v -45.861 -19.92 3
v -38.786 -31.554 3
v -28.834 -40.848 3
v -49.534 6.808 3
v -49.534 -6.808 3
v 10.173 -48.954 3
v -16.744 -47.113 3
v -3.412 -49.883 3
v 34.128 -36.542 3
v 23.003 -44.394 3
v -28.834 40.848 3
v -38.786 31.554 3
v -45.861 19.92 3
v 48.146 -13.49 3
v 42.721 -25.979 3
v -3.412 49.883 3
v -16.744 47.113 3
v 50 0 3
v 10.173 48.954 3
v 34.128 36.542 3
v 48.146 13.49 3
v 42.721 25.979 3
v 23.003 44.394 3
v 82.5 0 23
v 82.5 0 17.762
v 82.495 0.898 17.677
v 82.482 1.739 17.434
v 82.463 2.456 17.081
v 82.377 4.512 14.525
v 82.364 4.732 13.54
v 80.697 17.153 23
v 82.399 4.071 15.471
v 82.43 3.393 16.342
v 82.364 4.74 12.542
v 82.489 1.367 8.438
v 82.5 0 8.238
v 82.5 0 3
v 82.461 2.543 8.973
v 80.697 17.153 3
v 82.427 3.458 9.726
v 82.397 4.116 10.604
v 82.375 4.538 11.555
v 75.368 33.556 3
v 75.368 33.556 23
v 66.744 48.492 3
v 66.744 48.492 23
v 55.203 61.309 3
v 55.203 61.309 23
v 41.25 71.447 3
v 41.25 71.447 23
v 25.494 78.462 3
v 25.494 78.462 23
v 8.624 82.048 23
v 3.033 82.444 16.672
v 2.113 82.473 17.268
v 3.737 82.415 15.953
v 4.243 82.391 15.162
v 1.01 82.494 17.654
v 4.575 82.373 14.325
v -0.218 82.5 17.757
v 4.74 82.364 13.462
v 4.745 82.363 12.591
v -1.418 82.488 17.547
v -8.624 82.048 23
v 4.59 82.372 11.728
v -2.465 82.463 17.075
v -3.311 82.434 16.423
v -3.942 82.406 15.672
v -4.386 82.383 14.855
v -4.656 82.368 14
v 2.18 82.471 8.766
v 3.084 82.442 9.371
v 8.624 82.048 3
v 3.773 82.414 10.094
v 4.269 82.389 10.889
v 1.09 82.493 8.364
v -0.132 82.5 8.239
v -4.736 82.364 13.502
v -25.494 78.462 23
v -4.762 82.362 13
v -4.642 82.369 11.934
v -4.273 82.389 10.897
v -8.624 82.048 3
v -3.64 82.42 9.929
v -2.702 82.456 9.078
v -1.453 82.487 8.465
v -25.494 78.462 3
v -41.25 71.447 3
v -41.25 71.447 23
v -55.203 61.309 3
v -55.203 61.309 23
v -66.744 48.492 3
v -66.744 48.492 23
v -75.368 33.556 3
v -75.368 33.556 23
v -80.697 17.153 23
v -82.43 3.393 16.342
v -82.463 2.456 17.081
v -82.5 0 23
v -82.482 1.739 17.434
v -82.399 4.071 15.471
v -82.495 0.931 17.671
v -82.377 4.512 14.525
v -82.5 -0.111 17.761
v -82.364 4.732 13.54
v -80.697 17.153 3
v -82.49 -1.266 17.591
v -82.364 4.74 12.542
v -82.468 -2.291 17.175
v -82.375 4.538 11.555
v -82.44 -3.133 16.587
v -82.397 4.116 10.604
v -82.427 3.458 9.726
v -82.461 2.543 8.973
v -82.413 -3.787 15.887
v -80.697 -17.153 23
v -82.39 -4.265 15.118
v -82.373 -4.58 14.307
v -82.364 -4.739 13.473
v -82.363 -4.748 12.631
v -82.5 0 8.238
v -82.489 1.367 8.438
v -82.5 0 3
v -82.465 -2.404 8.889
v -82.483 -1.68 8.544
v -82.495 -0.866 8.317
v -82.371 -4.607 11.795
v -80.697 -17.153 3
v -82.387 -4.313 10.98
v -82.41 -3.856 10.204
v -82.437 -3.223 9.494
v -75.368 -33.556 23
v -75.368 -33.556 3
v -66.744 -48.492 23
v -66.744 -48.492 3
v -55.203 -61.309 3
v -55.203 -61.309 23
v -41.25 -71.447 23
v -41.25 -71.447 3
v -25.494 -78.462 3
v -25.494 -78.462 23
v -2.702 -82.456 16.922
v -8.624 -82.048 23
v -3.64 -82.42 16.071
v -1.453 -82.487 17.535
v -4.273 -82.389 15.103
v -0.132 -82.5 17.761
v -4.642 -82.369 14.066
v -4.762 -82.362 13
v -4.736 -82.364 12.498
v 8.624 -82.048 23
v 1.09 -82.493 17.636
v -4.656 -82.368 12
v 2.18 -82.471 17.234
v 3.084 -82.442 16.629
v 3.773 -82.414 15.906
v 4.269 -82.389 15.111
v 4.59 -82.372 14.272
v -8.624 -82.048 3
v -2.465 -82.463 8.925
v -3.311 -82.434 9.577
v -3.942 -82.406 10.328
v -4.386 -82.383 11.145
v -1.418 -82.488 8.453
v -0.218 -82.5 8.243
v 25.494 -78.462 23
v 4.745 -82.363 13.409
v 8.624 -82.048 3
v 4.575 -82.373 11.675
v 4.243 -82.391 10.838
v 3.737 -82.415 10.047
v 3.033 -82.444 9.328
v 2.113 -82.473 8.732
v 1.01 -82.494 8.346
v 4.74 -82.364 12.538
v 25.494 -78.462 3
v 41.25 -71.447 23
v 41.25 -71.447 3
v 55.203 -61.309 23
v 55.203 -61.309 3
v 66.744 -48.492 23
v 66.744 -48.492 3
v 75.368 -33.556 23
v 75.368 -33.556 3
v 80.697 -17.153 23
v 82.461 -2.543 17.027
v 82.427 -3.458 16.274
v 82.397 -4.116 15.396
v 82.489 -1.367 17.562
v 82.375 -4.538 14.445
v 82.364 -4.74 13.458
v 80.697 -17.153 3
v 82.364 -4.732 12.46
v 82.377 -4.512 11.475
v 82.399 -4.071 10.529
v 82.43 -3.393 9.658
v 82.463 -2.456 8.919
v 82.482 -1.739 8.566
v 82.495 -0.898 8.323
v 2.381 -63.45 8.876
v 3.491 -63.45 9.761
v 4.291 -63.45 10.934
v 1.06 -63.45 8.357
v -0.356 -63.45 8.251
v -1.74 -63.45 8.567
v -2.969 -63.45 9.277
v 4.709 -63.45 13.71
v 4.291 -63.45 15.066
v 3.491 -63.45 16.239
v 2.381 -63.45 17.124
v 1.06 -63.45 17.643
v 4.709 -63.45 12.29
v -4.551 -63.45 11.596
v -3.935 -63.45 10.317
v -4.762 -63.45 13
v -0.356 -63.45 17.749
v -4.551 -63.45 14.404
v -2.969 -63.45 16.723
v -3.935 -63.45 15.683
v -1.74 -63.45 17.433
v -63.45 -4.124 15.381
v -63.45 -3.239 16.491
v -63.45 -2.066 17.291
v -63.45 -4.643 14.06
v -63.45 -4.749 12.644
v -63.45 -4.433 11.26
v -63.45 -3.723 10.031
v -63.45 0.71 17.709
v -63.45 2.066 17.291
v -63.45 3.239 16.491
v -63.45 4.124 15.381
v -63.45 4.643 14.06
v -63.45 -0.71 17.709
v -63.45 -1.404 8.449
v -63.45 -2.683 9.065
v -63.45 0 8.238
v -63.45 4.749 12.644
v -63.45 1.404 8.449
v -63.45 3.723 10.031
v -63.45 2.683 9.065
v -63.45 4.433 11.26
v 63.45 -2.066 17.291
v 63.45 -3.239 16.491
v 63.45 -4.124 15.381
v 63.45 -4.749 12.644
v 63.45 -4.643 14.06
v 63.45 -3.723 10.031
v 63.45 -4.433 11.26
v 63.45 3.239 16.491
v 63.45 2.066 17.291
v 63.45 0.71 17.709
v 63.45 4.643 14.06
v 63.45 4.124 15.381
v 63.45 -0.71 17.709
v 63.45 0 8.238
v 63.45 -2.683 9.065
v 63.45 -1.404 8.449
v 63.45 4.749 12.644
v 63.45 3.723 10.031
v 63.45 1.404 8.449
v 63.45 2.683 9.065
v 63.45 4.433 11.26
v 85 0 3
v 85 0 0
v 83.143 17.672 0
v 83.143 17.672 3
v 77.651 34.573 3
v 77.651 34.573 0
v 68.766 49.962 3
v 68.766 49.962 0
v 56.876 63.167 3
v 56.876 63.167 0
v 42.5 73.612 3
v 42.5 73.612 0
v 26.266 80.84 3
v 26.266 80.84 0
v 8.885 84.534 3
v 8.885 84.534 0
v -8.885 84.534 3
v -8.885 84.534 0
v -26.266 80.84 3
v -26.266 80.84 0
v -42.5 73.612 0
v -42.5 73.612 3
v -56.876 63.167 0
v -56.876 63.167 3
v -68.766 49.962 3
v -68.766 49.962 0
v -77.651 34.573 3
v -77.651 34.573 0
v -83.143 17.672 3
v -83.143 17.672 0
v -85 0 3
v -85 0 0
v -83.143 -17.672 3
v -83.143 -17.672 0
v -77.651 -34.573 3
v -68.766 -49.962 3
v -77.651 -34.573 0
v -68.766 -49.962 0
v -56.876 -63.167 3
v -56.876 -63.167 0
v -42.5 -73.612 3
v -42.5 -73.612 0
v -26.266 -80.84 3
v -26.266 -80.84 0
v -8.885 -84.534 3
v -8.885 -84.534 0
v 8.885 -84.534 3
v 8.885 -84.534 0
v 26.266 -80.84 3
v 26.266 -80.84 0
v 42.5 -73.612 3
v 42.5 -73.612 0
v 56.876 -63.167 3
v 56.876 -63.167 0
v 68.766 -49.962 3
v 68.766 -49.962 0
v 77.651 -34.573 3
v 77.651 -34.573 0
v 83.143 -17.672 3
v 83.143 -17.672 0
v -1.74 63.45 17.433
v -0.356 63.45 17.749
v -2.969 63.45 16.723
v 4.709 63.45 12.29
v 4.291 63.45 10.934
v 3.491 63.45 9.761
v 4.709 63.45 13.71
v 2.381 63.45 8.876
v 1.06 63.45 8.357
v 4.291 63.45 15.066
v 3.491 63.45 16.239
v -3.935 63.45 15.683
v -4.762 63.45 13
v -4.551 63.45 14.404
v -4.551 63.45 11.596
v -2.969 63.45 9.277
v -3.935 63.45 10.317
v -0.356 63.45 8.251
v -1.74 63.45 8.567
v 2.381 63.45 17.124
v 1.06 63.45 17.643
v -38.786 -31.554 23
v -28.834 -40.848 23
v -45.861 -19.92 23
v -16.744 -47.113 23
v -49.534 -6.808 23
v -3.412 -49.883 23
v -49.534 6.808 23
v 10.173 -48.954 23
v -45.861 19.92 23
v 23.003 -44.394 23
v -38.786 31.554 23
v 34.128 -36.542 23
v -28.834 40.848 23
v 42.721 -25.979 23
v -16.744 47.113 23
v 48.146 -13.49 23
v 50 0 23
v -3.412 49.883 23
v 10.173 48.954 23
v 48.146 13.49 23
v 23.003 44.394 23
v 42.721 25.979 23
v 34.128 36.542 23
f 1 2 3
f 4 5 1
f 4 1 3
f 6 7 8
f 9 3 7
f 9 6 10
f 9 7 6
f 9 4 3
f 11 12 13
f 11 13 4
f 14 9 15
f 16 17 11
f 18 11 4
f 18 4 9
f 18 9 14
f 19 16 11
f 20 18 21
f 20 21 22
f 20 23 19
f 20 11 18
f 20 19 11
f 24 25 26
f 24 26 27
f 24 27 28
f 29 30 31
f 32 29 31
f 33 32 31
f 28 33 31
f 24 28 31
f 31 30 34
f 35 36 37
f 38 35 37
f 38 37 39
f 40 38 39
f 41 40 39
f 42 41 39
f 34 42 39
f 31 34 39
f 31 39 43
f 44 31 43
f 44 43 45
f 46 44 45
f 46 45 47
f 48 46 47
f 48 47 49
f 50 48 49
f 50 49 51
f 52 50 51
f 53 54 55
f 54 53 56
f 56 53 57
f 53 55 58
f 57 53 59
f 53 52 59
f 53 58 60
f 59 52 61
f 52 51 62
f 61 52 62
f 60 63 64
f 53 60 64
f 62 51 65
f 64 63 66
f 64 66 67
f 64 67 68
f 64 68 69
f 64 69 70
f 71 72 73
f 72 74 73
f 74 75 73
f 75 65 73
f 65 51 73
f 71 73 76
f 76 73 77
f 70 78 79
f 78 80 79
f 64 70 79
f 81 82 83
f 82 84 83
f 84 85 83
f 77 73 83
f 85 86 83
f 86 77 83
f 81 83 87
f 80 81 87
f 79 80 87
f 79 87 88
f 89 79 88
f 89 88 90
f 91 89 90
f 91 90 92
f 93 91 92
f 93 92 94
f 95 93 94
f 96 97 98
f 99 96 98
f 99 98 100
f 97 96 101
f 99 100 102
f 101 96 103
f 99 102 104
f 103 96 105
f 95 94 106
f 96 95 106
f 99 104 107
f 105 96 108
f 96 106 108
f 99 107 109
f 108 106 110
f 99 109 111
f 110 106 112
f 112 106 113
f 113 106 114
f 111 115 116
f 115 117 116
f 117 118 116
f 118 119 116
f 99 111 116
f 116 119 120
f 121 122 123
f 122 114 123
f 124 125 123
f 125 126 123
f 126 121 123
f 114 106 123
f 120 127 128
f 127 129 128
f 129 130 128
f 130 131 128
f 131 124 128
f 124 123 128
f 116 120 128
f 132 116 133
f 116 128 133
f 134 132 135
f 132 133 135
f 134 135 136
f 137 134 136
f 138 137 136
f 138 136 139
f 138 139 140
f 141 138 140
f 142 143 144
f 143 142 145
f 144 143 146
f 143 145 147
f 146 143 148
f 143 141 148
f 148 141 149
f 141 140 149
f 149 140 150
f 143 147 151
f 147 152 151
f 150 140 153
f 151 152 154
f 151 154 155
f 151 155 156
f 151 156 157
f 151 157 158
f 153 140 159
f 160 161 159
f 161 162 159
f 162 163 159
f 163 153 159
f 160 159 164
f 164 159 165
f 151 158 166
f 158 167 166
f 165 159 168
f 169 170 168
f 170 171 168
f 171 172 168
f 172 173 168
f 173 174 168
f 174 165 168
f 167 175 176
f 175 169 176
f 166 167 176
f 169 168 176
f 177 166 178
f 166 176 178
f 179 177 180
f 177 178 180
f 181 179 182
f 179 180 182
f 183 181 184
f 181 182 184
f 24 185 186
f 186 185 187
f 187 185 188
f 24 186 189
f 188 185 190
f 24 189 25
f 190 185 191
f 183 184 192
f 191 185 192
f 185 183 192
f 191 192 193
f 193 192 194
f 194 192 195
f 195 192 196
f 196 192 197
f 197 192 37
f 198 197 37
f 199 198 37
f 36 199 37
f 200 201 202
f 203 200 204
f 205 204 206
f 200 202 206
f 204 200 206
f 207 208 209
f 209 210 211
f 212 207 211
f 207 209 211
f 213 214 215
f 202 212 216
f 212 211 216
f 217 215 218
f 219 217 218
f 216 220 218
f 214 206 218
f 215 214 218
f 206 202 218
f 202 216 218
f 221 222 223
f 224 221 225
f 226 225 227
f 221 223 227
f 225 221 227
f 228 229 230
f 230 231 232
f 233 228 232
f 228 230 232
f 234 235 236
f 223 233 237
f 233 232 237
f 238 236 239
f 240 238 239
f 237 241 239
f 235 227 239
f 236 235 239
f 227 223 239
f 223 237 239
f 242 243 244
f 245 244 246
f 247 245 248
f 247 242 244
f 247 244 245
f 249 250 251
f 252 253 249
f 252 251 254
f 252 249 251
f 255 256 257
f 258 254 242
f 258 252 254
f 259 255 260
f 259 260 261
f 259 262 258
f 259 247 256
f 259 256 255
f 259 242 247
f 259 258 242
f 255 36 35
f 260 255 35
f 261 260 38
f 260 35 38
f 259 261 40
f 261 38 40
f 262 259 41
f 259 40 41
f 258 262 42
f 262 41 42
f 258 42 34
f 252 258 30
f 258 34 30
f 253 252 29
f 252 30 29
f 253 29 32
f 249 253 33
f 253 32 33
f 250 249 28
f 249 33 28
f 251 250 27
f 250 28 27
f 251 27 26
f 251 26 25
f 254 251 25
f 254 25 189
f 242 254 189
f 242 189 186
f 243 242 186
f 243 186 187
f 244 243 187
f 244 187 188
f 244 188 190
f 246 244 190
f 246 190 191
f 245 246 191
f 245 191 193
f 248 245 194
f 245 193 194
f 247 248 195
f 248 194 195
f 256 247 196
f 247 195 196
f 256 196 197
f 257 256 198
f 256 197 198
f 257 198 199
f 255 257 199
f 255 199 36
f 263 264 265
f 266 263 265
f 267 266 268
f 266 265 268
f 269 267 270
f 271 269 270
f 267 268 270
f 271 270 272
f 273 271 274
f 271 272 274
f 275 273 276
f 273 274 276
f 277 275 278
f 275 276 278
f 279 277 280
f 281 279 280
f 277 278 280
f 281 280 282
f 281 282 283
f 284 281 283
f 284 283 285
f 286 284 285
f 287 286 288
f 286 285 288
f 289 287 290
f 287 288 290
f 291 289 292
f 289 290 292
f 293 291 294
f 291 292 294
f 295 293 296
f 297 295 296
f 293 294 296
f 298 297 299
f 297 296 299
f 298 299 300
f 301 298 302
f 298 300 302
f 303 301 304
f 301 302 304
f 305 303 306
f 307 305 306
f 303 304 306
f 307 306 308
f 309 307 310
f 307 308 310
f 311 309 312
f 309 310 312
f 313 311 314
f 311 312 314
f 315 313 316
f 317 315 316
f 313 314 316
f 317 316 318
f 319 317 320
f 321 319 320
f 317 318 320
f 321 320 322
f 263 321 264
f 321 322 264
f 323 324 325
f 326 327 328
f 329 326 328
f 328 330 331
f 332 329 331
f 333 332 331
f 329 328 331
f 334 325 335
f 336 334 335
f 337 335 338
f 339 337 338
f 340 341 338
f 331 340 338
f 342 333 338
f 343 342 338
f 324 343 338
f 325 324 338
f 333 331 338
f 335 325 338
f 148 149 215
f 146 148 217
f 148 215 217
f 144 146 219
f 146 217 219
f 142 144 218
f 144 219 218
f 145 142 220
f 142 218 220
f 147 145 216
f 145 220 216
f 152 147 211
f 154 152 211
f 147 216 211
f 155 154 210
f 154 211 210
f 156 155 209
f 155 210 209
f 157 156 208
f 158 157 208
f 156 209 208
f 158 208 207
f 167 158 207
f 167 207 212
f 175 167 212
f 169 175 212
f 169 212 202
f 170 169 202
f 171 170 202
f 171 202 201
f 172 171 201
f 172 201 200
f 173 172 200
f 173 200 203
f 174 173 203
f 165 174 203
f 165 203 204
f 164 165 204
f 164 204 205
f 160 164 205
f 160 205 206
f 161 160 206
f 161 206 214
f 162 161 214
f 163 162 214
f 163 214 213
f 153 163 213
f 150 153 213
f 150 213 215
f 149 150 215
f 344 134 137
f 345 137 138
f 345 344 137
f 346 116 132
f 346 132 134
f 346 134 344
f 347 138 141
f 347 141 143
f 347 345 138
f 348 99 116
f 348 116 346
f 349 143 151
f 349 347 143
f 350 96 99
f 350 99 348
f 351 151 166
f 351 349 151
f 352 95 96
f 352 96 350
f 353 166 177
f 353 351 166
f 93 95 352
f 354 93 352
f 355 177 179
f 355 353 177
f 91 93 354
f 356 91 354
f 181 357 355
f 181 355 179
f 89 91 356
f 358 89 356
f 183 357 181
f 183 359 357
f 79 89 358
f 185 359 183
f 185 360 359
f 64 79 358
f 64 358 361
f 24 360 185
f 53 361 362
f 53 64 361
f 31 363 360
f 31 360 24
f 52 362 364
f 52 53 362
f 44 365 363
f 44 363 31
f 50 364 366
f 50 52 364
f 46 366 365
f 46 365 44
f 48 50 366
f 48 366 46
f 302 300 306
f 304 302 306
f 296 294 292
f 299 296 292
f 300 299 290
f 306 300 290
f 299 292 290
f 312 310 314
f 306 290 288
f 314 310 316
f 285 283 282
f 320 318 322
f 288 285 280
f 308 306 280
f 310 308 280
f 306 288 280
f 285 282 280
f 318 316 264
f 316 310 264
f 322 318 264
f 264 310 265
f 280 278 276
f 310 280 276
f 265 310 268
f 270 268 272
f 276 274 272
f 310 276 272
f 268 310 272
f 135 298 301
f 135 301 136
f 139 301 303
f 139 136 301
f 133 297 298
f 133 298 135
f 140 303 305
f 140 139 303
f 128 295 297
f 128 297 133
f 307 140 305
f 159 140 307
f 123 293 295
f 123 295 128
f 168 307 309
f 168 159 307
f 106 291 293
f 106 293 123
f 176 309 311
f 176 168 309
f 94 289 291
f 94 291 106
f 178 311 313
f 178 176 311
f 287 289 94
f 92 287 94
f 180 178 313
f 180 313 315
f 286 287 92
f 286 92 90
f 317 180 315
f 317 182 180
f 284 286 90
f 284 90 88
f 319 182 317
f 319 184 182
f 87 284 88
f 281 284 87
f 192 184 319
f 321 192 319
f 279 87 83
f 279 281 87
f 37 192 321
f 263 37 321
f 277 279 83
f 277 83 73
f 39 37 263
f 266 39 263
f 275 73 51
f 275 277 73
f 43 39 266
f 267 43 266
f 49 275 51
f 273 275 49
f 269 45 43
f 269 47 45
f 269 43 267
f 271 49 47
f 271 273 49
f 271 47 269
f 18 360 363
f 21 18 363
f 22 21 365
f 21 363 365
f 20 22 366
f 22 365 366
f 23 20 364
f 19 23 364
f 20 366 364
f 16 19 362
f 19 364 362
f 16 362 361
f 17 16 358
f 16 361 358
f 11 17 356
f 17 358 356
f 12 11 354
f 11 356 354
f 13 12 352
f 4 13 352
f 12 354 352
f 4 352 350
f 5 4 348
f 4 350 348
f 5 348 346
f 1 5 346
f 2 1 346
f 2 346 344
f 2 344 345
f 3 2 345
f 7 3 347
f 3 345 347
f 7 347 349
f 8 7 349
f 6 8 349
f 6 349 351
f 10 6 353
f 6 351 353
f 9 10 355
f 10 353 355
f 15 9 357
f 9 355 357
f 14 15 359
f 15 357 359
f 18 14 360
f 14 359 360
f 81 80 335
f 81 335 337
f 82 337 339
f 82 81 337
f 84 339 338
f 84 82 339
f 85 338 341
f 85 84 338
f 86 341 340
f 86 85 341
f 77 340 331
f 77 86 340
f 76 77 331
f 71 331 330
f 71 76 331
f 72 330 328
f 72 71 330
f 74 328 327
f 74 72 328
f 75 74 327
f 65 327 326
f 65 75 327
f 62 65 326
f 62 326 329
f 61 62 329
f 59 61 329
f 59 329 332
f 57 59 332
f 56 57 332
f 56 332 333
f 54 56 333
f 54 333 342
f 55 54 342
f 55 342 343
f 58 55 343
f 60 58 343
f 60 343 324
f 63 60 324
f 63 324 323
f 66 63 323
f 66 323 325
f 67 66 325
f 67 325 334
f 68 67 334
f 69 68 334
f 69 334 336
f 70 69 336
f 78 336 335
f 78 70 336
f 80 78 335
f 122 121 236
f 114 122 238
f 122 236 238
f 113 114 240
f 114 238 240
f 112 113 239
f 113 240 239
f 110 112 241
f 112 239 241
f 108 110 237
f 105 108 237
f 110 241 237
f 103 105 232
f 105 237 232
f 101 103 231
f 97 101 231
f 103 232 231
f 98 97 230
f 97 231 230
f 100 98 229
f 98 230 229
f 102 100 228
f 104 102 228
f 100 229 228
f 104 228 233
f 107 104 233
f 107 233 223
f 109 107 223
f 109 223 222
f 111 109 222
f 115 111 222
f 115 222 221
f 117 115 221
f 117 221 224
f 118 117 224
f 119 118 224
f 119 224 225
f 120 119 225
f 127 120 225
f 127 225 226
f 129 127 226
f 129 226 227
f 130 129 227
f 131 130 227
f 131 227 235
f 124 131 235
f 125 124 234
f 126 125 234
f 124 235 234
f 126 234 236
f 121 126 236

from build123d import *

# Parameters (mm, degrees)
SKETCH1_R           = 85
BOSS_EXTRUDE2_DEPTH = 3
SKETCH2_R           = 82.5
BOSS_EXTRUDE3_DEPTH = 20
SKETCH3_R           = 50
CUT_EXTRUDE1_DEPTH  = 20
SKETCH9_R           = 4.7625
CUT_EXTRUDE9_DEPTH  = 19.05
SKETCH14_R          = 4.7625
CUT_EXTRUDE10_DEPTH = 19.05
CUT_EXTRUDE11_START = 19.05
SKETCH13_R          = 4.7625
CUT_EXTRUDE11_DEPTH = 19.05
CUT_EXTRUDE12_START = 19.05
SKETCH15_R          = 4.7625
CUT_EXTRUDE12_DEPTH = 19.05


with BuildPart() as part:
    # Sketch1 → Boss-Extrude2 (new body)
    with BuildSketch(Plane.XY):
        Circle(SKETCH1_R)
    extrude(amount=BOSS_EXTRUDE2_DEPTH)

    # Sketch2 → Boss-Extrude3 (add)
    with BuildSketch(Plane.XY.offset(3)):
        Circle(SKETCH2_R)
    extrude(amount=BOSS_EXTRUDE3_DEPTH)

    # Sketch3 → Cut-Extrude1 (cut)
    with BuildSketch(Plane.XY.offset(23)):
        Circle(SKETCH3_R)
    extrude(amount=-CUT_EXTRUDE1_DEPTH, mode=Mode.SUBTRACT)

    # Sketch9 → Cut-Extrude9 (cut)
    with BuildSketch(Plane(origin=(0, 82.5, 0), x_dir=(-1, 0, 0), z_dir=(0, -1, 0))):
        with Locations((0, -13)):
            Circle(SKETCH9_R)
    extrude(amount=CUT_EXTRUDE9_DEPTH, mode=Mode.SUBTRACT)

    # Sketch14 → Cut-Extrude10 (cut)
    with BuildSketch(Plane(origin=(82.5, 0, 0), x_dir=(0, 0, -1), z_dir=(1, 0, 0))):
        with Locations((-13, 0)):
            Circle(SKETCH14_R)
    extrude(amount=-CUT_EXTRUDE10_DEPTH, mode=Mode.SUBTRACT)

    # Sketch13 → Cut-Extrude11 (cut)
    with BuildSketch(Plane(origin=(0, -82.5, 0), x_dir=(1, 0, 0), z_dir=(0, 1, 0)).offset(CUT_EXTRUDE11_START)):
        with Locations(Location((0, -13, 0), (0, 0, 180))):
            Circle(SKETCH13_R)
    extrude(amount=-CUT_EXTRUDE11_DEPTH, mode=Mode.SUBTRACT)

    # Sketch15 → Cut-Extrude12 (cut)
    with BuildSketch(Plane(origin=(-82.5, 0, 0), x_dir=(0, 0, -1), z_dir=(1, 0, 0)).offset(CUT_EXTRUDE12_START)):
        with Locations((-13, 0)):
            Circle(SKETCH15_R)
    extrude(amount=-CUT_EXTRUDE12_DEPTH, mode=Mode.SUBTRACT)


solid = part.part
